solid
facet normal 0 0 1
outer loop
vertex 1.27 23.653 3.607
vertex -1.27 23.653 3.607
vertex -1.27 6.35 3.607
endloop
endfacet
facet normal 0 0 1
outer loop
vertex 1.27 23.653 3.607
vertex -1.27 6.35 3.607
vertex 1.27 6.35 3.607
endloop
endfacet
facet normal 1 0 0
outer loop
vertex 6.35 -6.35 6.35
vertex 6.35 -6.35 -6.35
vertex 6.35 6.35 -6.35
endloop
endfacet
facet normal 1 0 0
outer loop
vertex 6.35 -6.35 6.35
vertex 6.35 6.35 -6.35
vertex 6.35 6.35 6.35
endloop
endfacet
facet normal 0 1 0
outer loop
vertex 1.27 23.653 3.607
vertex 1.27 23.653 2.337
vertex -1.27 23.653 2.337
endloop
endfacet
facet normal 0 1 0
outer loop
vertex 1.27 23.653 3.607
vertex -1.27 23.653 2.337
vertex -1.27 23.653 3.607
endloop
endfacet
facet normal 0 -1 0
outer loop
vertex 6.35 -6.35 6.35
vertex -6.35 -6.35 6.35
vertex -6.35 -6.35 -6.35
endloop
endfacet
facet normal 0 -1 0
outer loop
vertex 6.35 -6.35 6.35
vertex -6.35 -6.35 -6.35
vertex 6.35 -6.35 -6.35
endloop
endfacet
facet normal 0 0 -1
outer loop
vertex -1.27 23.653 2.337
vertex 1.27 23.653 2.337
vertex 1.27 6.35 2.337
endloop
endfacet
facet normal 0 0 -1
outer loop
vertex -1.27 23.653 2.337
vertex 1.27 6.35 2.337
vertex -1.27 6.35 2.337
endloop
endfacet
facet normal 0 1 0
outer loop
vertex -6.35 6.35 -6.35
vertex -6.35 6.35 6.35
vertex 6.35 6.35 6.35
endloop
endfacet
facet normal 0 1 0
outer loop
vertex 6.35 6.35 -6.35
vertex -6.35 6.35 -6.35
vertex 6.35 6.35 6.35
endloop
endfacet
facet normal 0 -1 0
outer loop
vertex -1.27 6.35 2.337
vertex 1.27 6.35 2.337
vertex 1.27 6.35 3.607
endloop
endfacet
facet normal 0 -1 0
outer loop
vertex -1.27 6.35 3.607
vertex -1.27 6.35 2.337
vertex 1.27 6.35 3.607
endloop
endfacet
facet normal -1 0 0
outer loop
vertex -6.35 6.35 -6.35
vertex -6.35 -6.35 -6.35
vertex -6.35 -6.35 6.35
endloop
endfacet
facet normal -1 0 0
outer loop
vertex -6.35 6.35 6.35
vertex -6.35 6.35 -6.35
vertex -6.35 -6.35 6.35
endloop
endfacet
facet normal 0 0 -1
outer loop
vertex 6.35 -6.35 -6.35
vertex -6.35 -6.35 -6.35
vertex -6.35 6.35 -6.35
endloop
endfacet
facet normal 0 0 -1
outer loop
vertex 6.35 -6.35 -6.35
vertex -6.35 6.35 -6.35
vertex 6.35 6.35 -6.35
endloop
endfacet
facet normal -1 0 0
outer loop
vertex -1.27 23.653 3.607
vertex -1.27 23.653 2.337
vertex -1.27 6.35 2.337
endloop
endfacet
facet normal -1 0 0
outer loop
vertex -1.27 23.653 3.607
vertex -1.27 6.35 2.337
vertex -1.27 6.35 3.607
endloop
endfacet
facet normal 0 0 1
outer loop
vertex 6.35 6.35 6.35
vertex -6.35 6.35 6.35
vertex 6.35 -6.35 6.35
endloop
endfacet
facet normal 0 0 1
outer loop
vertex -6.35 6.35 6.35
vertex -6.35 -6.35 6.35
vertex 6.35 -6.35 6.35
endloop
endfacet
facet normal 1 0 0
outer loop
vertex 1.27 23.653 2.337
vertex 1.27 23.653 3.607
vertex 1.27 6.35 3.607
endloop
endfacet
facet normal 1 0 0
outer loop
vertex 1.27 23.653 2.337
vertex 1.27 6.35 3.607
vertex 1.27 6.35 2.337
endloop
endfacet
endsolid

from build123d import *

# Parameters (mm, degrees)
F1_W     = 12.7
F1_H     = 12.7
F2_DEPTH = 6.35
F4_W     = 2.54
F4_H     = 1.27


# Not quite as in the source:
# - a variable given as a bare number and used for a length is read in inches; the dataset says mm whatever the document's units were


with BuildPart() as f2:
    # F1 (on Front) → F2 (new body, symmetric)
    with BuildSketch(Plane.XZ):
        Rectangle(F1_W, F1_H)
    extrude(amount=F2_DEPTH, both=True)


with BuildPart() as f5:
    # F5: sweep along a path in F3
    with BuildLine(Plane.YZ) as f5_path:
        Line((6.35, 2.9724712949), (23.6533820465, 2.9724712949))
    # F4 (on face) → F5 (sweep)
    with BuildSketch(Plane(origin=(0, 6.35, 0), x_dir=(-1, 0, 0), z_dir=(0, 1, 0))):
        with Locations((0, 2.9724712949)):
            Rectangle(F4_W, F4_H)
    sweep(path=f5_path.line)


solid = Compound([f2.part, f5.part])
